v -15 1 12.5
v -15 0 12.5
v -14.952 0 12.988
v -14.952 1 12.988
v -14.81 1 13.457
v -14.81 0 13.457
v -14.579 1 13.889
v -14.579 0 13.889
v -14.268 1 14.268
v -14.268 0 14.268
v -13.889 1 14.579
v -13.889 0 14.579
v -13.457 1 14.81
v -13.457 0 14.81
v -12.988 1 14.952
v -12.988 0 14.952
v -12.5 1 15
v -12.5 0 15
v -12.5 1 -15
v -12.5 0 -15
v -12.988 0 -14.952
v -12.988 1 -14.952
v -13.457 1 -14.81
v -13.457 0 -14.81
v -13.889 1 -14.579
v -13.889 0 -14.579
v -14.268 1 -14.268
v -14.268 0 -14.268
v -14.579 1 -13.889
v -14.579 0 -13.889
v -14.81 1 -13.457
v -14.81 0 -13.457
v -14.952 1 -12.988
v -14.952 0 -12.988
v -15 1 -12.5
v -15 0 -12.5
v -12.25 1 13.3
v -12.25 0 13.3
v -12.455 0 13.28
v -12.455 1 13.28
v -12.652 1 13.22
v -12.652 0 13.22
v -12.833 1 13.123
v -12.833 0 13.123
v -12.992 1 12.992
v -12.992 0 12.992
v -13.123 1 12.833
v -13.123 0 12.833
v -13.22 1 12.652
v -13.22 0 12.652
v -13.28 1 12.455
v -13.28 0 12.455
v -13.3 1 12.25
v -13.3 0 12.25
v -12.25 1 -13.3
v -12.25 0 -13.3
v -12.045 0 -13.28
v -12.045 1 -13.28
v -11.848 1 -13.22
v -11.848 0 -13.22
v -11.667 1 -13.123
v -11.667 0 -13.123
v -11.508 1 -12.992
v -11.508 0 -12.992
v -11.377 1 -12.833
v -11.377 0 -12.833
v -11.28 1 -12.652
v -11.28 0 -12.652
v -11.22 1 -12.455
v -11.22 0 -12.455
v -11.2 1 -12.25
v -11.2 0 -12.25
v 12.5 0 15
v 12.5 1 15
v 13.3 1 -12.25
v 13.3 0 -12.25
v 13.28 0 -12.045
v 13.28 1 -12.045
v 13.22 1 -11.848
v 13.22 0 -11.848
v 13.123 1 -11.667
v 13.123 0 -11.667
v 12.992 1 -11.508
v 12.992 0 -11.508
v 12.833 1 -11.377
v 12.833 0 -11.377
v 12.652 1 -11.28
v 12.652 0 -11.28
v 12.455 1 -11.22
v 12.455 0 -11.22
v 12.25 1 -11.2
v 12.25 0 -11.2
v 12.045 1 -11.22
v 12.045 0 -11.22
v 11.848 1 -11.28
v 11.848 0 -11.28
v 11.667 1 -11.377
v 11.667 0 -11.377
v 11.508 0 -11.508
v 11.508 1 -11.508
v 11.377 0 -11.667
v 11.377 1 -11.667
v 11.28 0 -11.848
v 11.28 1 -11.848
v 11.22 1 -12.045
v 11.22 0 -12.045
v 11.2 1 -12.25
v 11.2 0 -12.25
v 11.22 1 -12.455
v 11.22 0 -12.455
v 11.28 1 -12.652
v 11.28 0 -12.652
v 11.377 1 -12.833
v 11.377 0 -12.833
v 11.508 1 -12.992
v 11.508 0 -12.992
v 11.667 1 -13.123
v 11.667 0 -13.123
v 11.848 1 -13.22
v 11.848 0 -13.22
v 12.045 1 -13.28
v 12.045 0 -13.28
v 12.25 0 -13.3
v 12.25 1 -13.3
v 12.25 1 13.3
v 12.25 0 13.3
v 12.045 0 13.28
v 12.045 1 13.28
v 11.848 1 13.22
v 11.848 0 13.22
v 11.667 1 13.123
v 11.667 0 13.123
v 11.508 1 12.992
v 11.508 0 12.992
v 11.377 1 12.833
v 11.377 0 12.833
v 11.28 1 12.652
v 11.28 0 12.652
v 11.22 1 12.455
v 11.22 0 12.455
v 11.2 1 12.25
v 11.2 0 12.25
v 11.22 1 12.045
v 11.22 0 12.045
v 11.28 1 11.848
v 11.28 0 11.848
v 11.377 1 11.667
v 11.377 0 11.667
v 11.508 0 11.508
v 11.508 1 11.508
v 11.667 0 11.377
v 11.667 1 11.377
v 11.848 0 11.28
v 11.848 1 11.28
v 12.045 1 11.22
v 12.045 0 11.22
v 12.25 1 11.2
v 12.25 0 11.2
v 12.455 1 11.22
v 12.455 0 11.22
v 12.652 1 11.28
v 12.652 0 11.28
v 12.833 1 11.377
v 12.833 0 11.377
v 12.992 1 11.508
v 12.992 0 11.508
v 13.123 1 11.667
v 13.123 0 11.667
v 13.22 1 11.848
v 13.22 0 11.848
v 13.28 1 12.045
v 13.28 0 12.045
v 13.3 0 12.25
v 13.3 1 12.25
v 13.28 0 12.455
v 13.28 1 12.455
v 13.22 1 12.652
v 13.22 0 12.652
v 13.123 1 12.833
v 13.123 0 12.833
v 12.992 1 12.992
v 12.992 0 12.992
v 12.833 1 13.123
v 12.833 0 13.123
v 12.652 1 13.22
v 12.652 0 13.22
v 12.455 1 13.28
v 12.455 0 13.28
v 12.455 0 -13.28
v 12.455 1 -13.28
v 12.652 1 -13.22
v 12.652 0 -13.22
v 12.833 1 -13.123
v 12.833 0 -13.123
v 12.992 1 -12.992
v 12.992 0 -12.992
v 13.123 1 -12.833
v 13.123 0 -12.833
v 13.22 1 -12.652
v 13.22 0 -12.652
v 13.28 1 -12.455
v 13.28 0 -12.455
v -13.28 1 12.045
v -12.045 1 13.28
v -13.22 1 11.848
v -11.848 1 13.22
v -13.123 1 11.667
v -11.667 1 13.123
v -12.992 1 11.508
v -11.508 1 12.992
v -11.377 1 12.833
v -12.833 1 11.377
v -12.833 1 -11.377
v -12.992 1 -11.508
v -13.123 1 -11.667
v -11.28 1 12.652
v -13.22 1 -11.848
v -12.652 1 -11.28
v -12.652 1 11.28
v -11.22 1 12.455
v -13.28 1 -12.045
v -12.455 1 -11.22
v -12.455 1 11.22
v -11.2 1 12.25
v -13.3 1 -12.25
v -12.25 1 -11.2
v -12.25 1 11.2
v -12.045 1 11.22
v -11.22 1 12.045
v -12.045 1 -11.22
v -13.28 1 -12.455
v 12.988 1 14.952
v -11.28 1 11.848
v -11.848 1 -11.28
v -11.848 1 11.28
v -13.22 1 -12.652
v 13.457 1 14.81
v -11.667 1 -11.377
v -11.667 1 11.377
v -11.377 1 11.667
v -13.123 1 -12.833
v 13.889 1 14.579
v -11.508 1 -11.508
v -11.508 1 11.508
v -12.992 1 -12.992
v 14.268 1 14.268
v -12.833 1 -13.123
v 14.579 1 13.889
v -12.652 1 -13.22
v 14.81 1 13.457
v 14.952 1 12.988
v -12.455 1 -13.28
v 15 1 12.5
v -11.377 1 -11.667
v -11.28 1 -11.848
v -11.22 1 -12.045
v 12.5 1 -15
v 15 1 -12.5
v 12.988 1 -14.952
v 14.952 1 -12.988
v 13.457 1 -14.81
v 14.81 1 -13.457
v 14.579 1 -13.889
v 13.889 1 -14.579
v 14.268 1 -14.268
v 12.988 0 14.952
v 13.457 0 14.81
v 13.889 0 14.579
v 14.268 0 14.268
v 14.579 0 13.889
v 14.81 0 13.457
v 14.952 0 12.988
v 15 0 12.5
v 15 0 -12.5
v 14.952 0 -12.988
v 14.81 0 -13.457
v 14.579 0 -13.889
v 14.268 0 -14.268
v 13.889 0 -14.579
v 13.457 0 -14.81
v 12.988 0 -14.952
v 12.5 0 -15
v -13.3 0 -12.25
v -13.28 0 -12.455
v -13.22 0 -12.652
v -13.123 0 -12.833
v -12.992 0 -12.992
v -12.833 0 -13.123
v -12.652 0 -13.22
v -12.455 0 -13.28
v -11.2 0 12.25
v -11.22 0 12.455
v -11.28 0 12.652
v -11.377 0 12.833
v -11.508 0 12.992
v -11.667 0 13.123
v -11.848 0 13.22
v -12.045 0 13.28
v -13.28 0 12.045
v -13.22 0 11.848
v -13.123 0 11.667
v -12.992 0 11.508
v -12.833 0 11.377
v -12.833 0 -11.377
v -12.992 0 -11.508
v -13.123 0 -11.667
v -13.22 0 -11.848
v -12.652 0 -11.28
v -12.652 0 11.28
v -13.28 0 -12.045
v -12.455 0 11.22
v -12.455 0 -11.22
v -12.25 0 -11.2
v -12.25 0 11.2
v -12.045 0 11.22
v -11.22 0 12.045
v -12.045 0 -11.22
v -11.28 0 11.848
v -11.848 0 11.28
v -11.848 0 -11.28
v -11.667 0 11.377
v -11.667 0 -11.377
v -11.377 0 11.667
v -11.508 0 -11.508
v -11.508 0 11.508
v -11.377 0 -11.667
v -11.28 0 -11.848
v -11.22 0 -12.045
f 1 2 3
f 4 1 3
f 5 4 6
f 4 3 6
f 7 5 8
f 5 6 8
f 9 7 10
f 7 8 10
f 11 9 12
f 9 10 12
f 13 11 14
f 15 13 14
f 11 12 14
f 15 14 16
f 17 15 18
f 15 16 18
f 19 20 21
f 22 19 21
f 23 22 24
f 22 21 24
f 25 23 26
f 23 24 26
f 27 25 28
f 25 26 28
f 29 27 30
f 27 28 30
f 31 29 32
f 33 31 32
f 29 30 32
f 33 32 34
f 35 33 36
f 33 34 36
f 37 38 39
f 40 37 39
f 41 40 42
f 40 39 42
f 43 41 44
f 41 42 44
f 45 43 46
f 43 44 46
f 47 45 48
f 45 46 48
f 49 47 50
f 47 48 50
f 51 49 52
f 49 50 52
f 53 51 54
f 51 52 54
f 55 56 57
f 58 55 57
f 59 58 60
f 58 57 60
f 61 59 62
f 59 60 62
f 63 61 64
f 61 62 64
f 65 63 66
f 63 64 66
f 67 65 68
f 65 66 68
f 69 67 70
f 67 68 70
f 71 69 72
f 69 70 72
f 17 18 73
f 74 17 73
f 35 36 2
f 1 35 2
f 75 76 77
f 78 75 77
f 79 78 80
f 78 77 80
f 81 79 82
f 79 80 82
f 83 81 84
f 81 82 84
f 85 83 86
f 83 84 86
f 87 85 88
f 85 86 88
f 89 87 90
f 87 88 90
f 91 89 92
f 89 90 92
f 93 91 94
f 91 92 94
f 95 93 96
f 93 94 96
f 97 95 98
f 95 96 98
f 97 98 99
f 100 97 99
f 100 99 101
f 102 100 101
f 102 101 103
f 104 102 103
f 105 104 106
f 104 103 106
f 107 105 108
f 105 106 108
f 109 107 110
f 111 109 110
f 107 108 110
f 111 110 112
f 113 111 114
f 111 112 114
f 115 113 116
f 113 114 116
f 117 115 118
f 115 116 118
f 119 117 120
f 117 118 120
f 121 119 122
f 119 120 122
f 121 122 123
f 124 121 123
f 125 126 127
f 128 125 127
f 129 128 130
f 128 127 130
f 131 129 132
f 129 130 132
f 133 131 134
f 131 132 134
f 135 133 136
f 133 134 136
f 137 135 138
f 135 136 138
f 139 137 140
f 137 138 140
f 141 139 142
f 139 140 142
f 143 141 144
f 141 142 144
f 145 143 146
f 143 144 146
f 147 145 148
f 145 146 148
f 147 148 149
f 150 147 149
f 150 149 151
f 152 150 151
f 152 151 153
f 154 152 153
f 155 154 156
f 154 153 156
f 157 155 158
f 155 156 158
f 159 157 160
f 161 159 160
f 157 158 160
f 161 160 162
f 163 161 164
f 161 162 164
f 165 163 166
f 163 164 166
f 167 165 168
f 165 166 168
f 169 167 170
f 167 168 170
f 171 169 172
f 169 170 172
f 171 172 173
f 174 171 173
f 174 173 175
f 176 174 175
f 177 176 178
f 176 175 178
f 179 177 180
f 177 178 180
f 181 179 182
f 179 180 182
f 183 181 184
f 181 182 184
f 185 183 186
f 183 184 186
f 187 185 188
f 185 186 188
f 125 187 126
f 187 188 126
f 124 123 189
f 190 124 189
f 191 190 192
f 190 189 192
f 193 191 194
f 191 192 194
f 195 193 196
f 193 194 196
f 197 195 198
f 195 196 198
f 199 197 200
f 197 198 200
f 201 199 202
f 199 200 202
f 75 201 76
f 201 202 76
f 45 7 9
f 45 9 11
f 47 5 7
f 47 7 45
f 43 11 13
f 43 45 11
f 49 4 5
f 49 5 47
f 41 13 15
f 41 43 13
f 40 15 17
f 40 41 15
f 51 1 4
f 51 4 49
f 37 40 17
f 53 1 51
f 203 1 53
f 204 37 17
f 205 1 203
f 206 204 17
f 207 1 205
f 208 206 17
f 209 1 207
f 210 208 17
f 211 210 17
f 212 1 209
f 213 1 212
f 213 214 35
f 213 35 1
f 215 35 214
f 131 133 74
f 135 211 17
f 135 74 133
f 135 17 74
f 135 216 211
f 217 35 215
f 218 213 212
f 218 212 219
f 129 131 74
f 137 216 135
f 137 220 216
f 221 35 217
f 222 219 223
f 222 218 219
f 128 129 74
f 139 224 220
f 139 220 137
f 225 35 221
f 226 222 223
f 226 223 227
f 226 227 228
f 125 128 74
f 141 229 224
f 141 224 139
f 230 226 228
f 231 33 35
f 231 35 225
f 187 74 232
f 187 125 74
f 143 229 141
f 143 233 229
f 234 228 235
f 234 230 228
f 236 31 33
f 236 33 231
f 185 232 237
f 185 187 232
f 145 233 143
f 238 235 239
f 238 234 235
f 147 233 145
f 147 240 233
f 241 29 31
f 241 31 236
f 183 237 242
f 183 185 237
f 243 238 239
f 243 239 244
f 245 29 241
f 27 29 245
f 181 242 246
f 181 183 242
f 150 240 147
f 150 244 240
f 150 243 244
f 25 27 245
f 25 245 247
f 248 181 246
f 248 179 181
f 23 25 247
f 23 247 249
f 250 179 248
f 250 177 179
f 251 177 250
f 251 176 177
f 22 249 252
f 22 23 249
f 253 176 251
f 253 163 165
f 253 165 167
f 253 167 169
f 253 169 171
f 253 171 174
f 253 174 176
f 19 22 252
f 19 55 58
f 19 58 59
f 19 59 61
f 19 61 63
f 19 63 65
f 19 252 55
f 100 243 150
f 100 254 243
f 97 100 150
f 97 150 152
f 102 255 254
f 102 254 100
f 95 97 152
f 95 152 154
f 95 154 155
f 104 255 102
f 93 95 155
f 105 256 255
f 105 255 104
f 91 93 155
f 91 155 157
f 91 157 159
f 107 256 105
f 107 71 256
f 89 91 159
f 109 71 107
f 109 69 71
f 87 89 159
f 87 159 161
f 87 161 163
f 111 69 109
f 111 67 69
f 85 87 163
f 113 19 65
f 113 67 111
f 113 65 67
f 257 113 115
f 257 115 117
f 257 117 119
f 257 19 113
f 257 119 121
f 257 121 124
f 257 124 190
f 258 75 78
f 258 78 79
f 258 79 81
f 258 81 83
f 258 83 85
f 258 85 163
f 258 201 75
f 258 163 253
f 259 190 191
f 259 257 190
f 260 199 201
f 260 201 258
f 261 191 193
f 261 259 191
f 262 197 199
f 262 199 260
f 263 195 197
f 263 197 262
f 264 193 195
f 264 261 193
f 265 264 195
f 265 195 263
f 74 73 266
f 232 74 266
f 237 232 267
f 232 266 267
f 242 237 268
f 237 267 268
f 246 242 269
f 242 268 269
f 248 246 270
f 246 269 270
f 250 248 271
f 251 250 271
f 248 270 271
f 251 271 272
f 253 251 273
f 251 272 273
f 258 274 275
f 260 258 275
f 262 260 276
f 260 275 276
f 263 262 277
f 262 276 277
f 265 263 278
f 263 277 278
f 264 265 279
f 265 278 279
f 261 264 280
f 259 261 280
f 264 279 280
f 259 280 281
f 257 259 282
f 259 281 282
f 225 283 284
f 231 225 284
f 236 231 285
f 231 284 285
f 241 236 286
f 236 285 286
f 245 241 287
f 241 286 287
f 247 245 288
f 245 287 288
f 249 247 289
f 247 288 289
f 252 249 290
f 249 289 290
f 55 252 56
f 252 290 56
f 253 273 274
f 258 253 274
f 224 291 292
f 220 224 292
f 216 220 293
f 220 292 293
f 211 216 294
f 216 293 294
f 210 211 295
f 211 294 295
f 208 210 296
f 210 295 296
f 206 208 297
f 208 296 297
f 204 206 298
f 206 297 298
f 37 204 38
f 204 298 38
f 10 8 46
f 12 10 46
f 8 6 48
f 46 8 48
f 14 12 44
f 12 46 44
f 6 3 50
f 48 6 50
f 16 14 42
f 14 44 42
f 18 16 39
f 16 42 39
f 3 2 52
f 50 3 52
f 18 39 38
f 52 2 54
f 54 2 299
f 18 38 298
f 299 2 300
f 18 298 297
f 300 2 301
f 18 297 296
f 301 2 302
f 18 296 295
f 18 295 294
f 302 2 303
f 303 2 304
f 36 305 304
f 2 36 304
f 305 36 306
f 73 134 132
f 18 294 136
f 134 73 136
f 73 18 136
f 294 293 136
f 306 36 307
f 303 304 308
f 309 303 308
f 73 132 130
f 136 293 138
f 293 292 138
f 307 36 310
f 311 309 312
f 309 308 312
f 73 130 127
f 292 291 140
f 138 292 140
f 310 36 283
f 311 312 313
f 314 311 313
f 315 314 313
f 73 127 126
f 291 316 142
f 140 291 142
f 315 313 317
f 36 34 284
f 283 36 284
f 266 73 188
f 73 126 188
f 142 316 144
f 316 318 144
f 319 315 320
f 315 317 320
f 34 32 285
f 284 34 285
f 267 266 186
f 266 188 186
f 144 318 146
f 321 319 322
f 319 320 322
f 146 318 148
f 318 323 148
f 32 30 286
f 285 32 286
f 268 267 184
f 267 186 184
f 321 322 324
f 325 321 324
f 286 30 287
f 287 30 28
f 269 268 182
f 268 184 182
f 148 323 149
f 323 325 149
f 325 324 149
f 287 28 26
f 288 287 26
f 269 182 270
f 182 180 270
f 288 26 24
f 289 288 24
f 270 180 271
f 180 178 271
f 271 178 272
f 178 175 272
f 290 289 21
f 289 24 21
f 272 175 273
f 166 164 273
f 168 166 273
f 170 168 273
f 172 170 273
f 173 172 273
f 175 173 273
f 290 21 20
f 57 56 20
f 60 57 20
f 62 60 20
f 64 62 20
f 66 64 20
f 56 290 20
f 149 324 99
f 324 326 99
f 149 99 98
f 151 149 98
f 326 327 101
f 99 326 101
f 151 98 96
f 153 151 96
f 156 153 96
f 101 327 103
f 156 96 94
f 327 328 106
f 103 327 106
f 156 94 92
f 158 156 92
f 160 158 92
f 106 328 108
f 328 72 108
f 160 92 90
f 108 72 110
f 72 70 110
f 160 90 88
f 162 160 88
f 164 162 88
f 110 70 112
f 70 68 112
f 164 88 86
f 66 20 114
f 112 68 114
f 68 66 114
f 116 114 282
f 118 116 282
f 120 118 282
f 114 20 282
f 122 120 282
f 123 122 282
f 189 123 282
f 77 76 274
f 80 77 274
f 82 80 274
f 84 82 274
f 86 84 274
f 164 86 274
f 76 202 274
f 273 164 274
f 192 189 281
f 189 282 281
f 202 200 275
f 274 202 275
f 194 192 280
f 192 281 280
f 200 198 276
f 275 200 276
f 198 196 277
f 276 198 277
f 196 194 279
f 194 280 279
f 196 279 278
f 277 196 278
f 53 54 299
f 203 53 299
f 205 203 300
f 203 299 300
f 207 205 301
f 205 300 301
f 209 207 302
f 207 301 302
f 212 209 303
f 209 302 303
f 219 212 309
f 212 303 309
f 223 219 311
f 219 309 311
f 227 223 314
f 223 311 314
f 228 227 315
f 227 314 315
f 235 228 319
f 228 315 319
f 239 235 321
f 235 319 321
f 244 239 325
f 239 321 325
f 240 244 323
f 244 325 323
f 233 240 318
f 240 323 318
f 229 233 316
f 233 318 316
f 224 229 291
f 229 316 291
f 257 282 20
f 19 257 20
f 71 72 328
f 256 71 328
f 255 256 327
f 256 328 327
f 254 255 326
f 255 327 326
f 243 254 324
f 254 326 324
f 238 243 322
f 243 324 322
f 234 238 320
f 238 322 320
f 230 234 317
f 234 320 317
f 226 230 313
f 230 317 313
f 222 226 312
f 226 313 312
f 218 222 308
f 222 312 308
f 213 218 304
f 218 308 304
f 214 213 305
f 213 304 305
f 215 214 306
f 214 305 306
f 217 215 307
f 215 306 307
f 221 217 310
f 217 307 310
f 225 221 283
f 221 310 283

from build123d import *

# Parameters (mm, degrees)
BOSS_EXTRUDE1_DEPTH = 1


with BuildPart() as part:
    # Sketch1 → Boss-Extrude1 (new body)
    with BuildSketch(Plane(origin=(0, 0, 0), x_dir=(1, 0, 0), z_dir=(0, 1, 0))):
        with BuildLine():
            Line((-12.25, -13.3), (-12.25, -15))
            Line((-12.25, -15), (12.25, -15))
            Line((12.25, -15), (12.25, -13.3))
            ThreePointArc((12.25, -13.3), (11.50753788, -11.50753788), (13.3, -12.25))
            Line((13.3, -12.25), (15, -12.25))
            Line((15, -12.25), (15, 12.25))
            Line((15, 12.25), (13.3, 12.25))
            ThreePointArc((13.3, 12.25), (11.50753788, 11.50753788), (12.25, 13.3))
            Line((12.25, 13.3), (12.25, 15))
            Line((12.25, 15), (-12.25, 15))
            Line((-12.25, 15), (-12.25, 13.3))
            ThreePointArc((-12.25, 13.3), (-11.50753788, 12.99246212), (-11.2, 12.25))
            ThreePointArc((-11.2, 12.25), (-12.25, 11.2), (-13.3, 12.25))
            Line((-13.3, 12.25), (-15, 12.25))
            Line((-15, 12.25), (-15, -12.25))
            Line((-15, -12.25), (-13.3, -12.25))
            ThreePointArc((-13.3, -12.25), (-12.25, -11.2), (-11.2, -12.25))
            ThreePointArc((-11.2, -12.25), (-11.50753788, -12.99246212), (-12.25, -13.3))
        make_face()
        with BuildLine():
            Line((-15, 12.5), (-15, 12.25))
            Line((-15, 12.25), (-13.3, 12.25))
            ThreePointArc((-13.3, 12.25), (-12.99246212, 12.99246212), (-12.25, 13.3))
            Line((-12.25, 13.3), (-12.25, 15))
            Line((-12.25, 15), (-12.5, 15))
            ThreePointArc((-12.5, 15), (-14.267766953, 14.267766953), (-15, 12.5))
        make_face()
        with BuildLine():
            Line((13.3, 12.25), (15, 12.25))
            Line((15, 12.25), (15, 12.5))
            ThreePointArc((15, 12.5), (14.267766953, 14.267766953), (12.5, 15))
            Line((12.5, 15), (12.25, 15))
            Line((12.25, 15), (12.25, 13.3))
            ThreePointArc((12.25, 13.3), (12.99246212, 12.99246212), (13.3, 12.25))
        make_face()
        with BuildLine():
            Line((12.25, -13.3), (12.25, -15))
            Line((12.25, -15), (12.5, -15))
            ThreePointArc((12.5, -15), (14.267766953, -14.267766953), (15, -12.5))
            Line((15, -12.5), (15, -12.25))
            Line((15, -12.25), (13.3, -12.25))
            ThreePointArc((13.3, -12.25), (12.99246212, -12.99246212), (12.25, -13.3))
        make_face()
        with BuildLine():
            ThreePointArc((-15, -12.5), (-14.267766953, -14.267766953), (-12.5, -15))
            Line((-12.5, -15), (-12.25, -15))
            Line((-12.25, -15), (-12.25, -13.3))
            ThreePointArc((-12.25, -13.3), (-12.99246212, -12.99246212), (-13.3, -12.25))
            Line((-13.3, -12.25), (-15, -12.25))
            Line((-15, -12.25), (-15, -12.5))
        make_face()
    extrude(amount=BOSS_EXTRUDE1_DEPTH)


solid = part.part
